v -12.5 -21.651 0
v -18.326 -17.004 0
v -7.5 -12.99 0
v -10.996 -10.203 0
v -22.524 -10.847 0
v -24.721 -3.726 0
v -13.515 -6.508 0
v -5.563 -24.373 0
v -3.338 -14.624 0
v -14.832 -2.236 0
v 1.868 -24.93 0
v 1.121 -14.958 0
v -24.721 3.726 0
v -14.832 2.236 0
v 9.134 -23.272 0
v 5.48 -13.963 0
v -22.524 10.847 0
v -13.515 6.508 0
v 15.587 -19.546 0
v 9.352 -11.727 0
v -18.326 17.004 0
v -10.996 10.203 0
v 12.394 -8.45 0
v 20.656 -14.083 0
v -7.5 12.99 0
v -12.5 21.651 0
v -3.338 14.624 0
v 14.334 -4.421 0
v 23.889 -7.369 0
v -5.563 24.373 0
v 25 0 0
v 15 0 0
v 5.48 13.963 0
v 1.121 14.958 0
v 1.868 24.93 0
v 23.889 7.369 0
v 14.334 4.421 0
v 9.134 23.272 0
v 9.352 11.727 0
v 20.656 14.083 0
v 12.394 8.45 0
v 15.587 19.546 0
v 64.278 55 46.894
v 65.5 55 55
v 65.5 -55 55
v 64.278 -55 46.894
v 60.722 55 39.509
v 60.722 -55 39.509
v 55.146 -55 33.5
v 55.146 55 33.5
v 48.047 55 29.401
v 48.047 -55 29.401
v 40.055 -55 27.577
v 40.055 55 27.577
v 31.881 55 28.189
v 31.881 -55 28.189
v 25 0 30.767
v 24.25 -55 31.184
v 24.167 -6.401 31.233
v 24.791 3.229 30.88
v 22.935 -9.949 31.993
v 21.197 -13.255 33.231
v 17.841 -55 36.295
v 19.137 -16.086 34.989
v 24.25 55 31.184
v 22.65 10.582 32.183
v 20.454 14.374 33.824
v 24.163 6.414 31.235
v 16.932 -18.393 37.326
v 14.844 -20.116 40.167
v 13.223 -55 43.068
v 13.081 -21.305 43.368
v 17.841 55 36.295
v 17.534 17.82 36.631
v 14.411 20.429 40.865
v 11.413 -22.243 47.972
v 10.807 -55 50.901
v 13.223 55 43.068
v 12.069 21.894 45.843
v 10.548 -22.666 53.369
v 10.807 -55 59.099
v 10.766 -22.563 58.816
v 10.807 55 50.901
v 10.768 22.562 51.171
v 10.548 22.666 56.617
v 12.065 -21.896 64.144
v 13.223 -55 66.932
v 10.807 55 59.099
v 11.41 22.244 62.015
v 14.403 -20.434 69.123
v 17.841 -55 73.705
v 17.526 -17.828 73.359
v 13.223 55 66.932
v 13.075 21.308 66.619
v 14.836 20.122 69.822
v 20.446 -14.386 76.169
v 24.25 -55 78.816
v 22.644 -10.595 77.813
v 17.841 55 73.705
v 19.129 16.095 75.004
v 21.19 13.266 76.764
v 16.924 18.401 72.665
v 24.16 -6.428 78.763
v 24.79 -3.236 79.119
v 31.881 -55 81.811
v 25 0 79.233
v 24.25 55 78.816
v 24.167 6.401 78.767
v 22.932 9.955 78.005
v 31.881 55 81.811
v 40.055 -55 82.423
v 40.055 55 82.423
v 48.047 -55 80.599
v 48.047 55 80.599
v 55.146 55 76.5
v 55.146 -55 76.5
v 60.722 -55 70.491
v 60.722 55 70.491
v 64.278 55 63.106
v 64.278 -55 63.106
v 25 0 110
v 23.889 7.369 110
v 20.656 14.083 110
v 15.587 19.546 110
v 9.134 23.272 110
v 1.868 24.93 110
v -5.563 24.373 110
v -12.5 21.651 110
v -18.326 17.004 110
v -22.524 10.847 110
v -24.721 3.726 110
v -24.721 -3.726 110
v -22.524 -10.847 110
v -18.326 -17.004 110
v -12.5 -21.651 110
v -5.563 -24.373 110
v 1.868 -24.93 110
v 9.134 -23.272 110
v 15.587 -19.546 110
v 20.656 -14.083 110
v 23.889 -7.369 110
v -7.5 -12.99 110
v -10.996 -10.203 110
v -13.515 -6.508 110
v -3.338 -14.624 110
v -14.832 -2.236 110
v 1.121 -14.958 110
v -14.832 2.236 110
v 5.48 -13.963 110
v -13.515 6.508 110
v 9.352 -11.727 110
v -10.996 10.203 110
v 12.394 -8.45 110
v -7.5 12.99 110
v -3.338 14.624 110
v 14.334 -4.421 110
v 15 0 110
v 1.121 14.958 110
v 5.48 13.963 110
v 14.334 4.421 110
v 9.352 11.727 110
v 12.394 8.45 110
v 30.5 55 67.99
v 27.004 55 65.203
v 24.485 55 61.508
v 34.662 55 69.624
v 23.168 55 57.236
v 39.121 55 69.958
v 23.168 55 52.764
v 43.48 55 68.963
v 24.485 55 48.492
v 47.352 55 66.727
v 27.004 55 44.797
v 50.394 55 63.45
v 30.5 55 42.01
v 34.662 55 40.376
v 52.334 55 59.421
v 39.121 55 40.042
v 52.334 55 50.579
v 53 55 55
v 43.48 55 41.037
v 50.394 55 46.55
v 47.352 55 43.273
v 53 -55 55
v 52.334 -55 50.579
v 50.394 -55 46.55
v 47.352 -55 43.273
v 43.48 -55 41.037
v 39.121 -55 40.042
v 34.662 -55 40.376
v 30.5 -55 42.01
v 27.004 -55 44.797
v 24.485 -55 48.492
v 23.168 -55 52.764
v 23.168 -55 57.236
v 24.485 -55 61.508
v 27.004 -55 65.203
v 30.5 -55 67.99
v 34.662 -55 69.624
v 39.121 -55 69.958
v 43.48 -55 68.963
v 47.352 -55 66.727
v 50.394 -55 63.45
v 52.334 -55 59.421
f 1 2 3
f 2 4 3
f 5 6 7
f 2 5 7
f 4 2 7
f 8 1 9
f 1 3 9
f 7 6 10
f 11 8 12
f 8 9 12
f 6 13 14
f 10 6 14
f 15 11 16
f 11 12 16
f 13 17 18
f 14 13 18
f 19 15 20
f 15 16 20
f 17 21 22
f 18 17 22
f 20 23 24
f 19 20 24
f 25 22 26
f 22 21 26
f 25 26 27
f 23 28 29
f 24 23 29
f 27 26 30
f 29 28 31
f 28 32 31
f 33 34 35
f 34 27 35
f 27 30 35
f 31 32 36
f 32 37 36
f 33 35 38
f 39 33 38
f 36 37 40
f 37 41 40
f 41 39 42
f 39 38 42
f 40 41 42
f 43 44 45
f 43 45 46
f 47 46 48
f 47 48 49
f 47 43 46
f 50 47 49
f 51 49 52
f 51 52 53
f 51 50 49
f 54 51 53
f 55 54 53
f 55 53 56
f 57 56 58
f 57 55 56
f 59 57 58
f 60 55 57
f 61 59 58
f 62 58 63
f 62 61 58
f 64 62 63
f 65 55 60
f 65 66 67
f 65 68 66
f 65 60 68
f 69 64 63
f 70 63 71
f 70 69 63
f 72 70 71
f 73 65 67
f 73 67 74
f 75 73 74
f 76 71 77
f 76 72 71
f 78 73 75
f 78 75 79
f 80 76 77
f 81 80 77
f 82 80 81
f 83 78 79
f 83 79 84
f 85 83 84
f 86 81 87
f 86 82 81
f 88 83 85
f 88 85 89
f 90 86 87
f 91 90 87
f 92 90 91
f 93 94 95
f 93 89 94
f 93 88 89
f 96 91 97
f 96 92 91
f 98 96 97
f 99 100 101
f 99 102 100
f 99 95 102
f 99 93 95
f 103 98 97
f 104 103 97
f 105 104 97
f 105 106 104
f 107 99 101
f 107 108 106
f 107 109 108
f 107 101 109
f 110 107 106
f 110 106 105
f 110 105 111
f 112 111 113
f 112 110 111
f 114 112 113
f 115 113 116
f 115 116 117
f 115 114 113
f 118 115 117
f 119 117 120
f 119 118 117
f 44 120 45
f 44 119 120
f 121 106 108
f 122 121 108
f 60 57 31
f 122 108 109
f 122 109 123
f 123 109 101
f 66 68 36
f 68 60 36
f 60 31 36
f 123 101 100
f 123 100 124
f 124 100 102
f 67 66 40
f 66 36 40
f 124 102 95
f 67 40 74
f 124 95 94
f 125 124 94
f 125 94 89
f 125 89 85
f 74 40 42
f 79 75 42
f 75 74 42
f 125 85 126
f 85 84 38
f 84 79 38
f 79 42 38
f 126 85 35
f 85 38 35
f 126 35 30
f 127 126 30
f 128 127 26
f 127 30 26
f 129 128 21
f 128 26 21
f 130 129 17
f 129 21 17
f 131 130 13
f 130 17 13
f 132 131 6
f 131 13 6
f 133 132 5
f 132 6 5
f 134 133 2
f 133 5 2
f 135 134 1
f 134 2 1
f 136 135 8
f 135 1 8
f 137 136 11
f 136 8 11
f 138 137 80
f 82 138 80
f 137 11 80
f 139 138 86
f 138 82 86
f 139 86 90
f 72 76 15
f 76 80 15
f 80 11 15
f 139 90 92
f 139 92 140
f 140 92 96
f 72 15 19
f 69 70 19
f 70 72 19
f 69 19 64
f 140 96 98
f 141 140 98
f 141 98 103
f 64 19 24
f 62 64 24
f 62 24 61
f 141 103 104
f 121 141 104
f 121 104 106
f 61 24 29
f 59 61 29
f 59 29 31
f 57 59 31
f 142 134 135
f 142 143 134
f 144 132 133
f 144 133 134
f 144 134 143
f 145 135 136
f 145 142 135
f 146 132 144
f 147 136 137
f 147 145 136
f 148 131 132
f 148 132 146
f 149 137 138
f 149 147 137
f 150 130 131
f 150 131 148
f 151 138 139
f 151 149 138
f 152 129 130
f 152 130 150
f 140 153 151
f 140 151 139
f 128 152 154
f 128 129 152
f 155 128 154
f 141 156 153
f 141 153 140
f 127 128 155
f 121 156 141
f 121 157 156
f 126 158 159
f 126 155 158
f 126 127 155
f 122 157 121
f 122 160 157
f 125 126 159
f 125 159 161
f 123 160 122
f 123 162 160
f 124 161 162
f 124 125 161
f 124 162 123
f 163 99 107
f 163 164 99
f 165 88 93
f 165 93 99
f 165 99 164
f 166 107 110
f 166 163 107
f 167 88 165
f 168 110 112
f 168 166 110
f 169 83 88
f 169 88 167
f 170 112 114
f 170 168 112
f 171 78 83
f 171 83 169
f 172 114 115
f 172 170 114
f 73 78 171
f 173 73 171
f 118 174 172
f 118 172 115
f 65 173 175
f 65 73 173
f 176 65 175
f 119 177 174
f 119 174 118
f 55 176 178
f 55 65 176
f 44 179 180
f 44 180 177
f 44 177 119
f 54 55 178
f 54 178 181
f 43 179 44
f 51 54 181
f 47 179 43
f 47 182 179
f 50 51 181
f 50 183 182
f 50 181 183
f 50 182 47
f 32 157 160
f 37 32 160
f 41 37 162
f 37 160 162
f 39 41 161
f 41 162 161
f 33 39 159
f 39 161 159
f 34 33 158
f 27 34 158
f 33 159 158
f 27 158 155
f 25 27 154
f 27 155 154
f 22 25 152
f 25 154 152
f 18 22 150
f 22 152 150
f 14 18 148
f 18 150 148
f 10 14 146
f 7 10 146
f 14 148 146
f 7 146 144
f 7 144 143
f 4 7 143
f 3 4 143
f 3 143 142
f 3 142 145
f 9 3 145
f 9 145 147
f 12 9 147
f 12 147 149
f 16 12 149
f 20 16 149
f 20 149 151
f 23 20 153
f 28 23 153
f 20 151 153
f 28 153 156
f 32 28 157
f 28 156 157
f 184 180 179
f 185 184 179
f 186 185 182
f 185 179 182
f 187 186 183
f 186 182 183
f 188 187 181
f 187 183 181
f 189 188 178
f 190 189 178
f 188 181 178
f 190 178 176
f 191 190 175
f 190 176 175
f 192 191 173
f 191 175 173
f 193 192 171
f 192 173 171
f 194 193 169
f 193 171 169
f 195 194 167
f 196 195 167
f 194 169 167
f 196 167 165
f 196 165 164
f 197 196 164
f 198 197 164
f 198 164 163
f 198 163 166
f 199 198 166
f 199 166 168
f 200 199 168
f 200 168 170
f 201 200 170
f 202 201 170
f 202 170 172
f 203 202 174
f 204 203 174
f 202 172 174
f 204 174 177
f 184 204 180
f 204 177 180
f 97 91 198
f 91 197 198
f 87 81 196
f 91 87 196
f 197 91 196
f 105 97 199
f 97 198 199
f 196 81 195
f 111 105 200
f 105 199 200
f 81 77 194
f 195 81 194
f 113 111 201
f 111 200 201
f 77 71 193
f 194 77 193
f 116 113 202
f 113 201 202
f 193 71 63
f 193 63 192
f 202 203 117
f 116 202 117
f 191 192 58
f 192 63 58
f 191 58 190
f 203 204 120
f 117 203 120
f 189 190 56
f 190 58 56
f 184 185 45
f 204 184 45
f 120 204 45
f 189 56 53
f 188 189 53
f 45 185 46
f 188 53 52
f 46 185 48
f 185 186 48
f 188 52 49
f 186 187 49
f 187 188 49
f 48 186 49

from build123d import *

# Parameters (mm, degrees)
SKETCH1_R           = 25
BOSS_EXTRUDE1_DEPTH = 110
SKETCH2_R           = 27.5
BOSS_EXTRUDE2_DEPTH = 55
SKETCH3_R           = 15
CUT_EXTRUDE1_DEPTH  = 110
SKETCH4_R           = 15
CUT_EXTRUDE3_DEPTH  = 110


with BuildPart() as part:
    # Sketch1 → Boss-Extrude1 (new body)
    with BuildSketch(Plane.XY):
        Circle(SKETCH1_R)
    extrude(amount=BOSS_EXTRUDE1_DEPTH)

    # Sketch2 → Boss-Extrude2 (add, symmetric)
    with BuildSketch(Plane(origin=(0, 0, 0), x_dir=(1, 0, 0), z_dir=(0, 1, 0))):
        with Locations((38, -55)):
            Circle(SKETCH2_R)
    extrude(amount=BOSS_EXTRUDE2_DEPTH, both=True)

    # Sketch3 → Cut-Extrude1 (cut)
    with BuildSketch(Plane.XY.offset(110)):
        Circle(SKETCH3_R)
    extrude(amount=-CUT_EXTRUDE1_DEPTH, mode=Mode.SUBTRACT)

    # Sketch4 → Cut-Extrude3 (cut)
    with BuildSketch(Plane(origin=(0, 55, 0), x_dir=(1, 0, 0), z_dir=(0, 1, 0))):
        with Locations((38, -55)):
            Circle(SKETCH4_R)
    extrude(amount=-CUT_EXTRUDE3_DEPTH, mode=Mode.SUBTRACT)


solid = part.part
